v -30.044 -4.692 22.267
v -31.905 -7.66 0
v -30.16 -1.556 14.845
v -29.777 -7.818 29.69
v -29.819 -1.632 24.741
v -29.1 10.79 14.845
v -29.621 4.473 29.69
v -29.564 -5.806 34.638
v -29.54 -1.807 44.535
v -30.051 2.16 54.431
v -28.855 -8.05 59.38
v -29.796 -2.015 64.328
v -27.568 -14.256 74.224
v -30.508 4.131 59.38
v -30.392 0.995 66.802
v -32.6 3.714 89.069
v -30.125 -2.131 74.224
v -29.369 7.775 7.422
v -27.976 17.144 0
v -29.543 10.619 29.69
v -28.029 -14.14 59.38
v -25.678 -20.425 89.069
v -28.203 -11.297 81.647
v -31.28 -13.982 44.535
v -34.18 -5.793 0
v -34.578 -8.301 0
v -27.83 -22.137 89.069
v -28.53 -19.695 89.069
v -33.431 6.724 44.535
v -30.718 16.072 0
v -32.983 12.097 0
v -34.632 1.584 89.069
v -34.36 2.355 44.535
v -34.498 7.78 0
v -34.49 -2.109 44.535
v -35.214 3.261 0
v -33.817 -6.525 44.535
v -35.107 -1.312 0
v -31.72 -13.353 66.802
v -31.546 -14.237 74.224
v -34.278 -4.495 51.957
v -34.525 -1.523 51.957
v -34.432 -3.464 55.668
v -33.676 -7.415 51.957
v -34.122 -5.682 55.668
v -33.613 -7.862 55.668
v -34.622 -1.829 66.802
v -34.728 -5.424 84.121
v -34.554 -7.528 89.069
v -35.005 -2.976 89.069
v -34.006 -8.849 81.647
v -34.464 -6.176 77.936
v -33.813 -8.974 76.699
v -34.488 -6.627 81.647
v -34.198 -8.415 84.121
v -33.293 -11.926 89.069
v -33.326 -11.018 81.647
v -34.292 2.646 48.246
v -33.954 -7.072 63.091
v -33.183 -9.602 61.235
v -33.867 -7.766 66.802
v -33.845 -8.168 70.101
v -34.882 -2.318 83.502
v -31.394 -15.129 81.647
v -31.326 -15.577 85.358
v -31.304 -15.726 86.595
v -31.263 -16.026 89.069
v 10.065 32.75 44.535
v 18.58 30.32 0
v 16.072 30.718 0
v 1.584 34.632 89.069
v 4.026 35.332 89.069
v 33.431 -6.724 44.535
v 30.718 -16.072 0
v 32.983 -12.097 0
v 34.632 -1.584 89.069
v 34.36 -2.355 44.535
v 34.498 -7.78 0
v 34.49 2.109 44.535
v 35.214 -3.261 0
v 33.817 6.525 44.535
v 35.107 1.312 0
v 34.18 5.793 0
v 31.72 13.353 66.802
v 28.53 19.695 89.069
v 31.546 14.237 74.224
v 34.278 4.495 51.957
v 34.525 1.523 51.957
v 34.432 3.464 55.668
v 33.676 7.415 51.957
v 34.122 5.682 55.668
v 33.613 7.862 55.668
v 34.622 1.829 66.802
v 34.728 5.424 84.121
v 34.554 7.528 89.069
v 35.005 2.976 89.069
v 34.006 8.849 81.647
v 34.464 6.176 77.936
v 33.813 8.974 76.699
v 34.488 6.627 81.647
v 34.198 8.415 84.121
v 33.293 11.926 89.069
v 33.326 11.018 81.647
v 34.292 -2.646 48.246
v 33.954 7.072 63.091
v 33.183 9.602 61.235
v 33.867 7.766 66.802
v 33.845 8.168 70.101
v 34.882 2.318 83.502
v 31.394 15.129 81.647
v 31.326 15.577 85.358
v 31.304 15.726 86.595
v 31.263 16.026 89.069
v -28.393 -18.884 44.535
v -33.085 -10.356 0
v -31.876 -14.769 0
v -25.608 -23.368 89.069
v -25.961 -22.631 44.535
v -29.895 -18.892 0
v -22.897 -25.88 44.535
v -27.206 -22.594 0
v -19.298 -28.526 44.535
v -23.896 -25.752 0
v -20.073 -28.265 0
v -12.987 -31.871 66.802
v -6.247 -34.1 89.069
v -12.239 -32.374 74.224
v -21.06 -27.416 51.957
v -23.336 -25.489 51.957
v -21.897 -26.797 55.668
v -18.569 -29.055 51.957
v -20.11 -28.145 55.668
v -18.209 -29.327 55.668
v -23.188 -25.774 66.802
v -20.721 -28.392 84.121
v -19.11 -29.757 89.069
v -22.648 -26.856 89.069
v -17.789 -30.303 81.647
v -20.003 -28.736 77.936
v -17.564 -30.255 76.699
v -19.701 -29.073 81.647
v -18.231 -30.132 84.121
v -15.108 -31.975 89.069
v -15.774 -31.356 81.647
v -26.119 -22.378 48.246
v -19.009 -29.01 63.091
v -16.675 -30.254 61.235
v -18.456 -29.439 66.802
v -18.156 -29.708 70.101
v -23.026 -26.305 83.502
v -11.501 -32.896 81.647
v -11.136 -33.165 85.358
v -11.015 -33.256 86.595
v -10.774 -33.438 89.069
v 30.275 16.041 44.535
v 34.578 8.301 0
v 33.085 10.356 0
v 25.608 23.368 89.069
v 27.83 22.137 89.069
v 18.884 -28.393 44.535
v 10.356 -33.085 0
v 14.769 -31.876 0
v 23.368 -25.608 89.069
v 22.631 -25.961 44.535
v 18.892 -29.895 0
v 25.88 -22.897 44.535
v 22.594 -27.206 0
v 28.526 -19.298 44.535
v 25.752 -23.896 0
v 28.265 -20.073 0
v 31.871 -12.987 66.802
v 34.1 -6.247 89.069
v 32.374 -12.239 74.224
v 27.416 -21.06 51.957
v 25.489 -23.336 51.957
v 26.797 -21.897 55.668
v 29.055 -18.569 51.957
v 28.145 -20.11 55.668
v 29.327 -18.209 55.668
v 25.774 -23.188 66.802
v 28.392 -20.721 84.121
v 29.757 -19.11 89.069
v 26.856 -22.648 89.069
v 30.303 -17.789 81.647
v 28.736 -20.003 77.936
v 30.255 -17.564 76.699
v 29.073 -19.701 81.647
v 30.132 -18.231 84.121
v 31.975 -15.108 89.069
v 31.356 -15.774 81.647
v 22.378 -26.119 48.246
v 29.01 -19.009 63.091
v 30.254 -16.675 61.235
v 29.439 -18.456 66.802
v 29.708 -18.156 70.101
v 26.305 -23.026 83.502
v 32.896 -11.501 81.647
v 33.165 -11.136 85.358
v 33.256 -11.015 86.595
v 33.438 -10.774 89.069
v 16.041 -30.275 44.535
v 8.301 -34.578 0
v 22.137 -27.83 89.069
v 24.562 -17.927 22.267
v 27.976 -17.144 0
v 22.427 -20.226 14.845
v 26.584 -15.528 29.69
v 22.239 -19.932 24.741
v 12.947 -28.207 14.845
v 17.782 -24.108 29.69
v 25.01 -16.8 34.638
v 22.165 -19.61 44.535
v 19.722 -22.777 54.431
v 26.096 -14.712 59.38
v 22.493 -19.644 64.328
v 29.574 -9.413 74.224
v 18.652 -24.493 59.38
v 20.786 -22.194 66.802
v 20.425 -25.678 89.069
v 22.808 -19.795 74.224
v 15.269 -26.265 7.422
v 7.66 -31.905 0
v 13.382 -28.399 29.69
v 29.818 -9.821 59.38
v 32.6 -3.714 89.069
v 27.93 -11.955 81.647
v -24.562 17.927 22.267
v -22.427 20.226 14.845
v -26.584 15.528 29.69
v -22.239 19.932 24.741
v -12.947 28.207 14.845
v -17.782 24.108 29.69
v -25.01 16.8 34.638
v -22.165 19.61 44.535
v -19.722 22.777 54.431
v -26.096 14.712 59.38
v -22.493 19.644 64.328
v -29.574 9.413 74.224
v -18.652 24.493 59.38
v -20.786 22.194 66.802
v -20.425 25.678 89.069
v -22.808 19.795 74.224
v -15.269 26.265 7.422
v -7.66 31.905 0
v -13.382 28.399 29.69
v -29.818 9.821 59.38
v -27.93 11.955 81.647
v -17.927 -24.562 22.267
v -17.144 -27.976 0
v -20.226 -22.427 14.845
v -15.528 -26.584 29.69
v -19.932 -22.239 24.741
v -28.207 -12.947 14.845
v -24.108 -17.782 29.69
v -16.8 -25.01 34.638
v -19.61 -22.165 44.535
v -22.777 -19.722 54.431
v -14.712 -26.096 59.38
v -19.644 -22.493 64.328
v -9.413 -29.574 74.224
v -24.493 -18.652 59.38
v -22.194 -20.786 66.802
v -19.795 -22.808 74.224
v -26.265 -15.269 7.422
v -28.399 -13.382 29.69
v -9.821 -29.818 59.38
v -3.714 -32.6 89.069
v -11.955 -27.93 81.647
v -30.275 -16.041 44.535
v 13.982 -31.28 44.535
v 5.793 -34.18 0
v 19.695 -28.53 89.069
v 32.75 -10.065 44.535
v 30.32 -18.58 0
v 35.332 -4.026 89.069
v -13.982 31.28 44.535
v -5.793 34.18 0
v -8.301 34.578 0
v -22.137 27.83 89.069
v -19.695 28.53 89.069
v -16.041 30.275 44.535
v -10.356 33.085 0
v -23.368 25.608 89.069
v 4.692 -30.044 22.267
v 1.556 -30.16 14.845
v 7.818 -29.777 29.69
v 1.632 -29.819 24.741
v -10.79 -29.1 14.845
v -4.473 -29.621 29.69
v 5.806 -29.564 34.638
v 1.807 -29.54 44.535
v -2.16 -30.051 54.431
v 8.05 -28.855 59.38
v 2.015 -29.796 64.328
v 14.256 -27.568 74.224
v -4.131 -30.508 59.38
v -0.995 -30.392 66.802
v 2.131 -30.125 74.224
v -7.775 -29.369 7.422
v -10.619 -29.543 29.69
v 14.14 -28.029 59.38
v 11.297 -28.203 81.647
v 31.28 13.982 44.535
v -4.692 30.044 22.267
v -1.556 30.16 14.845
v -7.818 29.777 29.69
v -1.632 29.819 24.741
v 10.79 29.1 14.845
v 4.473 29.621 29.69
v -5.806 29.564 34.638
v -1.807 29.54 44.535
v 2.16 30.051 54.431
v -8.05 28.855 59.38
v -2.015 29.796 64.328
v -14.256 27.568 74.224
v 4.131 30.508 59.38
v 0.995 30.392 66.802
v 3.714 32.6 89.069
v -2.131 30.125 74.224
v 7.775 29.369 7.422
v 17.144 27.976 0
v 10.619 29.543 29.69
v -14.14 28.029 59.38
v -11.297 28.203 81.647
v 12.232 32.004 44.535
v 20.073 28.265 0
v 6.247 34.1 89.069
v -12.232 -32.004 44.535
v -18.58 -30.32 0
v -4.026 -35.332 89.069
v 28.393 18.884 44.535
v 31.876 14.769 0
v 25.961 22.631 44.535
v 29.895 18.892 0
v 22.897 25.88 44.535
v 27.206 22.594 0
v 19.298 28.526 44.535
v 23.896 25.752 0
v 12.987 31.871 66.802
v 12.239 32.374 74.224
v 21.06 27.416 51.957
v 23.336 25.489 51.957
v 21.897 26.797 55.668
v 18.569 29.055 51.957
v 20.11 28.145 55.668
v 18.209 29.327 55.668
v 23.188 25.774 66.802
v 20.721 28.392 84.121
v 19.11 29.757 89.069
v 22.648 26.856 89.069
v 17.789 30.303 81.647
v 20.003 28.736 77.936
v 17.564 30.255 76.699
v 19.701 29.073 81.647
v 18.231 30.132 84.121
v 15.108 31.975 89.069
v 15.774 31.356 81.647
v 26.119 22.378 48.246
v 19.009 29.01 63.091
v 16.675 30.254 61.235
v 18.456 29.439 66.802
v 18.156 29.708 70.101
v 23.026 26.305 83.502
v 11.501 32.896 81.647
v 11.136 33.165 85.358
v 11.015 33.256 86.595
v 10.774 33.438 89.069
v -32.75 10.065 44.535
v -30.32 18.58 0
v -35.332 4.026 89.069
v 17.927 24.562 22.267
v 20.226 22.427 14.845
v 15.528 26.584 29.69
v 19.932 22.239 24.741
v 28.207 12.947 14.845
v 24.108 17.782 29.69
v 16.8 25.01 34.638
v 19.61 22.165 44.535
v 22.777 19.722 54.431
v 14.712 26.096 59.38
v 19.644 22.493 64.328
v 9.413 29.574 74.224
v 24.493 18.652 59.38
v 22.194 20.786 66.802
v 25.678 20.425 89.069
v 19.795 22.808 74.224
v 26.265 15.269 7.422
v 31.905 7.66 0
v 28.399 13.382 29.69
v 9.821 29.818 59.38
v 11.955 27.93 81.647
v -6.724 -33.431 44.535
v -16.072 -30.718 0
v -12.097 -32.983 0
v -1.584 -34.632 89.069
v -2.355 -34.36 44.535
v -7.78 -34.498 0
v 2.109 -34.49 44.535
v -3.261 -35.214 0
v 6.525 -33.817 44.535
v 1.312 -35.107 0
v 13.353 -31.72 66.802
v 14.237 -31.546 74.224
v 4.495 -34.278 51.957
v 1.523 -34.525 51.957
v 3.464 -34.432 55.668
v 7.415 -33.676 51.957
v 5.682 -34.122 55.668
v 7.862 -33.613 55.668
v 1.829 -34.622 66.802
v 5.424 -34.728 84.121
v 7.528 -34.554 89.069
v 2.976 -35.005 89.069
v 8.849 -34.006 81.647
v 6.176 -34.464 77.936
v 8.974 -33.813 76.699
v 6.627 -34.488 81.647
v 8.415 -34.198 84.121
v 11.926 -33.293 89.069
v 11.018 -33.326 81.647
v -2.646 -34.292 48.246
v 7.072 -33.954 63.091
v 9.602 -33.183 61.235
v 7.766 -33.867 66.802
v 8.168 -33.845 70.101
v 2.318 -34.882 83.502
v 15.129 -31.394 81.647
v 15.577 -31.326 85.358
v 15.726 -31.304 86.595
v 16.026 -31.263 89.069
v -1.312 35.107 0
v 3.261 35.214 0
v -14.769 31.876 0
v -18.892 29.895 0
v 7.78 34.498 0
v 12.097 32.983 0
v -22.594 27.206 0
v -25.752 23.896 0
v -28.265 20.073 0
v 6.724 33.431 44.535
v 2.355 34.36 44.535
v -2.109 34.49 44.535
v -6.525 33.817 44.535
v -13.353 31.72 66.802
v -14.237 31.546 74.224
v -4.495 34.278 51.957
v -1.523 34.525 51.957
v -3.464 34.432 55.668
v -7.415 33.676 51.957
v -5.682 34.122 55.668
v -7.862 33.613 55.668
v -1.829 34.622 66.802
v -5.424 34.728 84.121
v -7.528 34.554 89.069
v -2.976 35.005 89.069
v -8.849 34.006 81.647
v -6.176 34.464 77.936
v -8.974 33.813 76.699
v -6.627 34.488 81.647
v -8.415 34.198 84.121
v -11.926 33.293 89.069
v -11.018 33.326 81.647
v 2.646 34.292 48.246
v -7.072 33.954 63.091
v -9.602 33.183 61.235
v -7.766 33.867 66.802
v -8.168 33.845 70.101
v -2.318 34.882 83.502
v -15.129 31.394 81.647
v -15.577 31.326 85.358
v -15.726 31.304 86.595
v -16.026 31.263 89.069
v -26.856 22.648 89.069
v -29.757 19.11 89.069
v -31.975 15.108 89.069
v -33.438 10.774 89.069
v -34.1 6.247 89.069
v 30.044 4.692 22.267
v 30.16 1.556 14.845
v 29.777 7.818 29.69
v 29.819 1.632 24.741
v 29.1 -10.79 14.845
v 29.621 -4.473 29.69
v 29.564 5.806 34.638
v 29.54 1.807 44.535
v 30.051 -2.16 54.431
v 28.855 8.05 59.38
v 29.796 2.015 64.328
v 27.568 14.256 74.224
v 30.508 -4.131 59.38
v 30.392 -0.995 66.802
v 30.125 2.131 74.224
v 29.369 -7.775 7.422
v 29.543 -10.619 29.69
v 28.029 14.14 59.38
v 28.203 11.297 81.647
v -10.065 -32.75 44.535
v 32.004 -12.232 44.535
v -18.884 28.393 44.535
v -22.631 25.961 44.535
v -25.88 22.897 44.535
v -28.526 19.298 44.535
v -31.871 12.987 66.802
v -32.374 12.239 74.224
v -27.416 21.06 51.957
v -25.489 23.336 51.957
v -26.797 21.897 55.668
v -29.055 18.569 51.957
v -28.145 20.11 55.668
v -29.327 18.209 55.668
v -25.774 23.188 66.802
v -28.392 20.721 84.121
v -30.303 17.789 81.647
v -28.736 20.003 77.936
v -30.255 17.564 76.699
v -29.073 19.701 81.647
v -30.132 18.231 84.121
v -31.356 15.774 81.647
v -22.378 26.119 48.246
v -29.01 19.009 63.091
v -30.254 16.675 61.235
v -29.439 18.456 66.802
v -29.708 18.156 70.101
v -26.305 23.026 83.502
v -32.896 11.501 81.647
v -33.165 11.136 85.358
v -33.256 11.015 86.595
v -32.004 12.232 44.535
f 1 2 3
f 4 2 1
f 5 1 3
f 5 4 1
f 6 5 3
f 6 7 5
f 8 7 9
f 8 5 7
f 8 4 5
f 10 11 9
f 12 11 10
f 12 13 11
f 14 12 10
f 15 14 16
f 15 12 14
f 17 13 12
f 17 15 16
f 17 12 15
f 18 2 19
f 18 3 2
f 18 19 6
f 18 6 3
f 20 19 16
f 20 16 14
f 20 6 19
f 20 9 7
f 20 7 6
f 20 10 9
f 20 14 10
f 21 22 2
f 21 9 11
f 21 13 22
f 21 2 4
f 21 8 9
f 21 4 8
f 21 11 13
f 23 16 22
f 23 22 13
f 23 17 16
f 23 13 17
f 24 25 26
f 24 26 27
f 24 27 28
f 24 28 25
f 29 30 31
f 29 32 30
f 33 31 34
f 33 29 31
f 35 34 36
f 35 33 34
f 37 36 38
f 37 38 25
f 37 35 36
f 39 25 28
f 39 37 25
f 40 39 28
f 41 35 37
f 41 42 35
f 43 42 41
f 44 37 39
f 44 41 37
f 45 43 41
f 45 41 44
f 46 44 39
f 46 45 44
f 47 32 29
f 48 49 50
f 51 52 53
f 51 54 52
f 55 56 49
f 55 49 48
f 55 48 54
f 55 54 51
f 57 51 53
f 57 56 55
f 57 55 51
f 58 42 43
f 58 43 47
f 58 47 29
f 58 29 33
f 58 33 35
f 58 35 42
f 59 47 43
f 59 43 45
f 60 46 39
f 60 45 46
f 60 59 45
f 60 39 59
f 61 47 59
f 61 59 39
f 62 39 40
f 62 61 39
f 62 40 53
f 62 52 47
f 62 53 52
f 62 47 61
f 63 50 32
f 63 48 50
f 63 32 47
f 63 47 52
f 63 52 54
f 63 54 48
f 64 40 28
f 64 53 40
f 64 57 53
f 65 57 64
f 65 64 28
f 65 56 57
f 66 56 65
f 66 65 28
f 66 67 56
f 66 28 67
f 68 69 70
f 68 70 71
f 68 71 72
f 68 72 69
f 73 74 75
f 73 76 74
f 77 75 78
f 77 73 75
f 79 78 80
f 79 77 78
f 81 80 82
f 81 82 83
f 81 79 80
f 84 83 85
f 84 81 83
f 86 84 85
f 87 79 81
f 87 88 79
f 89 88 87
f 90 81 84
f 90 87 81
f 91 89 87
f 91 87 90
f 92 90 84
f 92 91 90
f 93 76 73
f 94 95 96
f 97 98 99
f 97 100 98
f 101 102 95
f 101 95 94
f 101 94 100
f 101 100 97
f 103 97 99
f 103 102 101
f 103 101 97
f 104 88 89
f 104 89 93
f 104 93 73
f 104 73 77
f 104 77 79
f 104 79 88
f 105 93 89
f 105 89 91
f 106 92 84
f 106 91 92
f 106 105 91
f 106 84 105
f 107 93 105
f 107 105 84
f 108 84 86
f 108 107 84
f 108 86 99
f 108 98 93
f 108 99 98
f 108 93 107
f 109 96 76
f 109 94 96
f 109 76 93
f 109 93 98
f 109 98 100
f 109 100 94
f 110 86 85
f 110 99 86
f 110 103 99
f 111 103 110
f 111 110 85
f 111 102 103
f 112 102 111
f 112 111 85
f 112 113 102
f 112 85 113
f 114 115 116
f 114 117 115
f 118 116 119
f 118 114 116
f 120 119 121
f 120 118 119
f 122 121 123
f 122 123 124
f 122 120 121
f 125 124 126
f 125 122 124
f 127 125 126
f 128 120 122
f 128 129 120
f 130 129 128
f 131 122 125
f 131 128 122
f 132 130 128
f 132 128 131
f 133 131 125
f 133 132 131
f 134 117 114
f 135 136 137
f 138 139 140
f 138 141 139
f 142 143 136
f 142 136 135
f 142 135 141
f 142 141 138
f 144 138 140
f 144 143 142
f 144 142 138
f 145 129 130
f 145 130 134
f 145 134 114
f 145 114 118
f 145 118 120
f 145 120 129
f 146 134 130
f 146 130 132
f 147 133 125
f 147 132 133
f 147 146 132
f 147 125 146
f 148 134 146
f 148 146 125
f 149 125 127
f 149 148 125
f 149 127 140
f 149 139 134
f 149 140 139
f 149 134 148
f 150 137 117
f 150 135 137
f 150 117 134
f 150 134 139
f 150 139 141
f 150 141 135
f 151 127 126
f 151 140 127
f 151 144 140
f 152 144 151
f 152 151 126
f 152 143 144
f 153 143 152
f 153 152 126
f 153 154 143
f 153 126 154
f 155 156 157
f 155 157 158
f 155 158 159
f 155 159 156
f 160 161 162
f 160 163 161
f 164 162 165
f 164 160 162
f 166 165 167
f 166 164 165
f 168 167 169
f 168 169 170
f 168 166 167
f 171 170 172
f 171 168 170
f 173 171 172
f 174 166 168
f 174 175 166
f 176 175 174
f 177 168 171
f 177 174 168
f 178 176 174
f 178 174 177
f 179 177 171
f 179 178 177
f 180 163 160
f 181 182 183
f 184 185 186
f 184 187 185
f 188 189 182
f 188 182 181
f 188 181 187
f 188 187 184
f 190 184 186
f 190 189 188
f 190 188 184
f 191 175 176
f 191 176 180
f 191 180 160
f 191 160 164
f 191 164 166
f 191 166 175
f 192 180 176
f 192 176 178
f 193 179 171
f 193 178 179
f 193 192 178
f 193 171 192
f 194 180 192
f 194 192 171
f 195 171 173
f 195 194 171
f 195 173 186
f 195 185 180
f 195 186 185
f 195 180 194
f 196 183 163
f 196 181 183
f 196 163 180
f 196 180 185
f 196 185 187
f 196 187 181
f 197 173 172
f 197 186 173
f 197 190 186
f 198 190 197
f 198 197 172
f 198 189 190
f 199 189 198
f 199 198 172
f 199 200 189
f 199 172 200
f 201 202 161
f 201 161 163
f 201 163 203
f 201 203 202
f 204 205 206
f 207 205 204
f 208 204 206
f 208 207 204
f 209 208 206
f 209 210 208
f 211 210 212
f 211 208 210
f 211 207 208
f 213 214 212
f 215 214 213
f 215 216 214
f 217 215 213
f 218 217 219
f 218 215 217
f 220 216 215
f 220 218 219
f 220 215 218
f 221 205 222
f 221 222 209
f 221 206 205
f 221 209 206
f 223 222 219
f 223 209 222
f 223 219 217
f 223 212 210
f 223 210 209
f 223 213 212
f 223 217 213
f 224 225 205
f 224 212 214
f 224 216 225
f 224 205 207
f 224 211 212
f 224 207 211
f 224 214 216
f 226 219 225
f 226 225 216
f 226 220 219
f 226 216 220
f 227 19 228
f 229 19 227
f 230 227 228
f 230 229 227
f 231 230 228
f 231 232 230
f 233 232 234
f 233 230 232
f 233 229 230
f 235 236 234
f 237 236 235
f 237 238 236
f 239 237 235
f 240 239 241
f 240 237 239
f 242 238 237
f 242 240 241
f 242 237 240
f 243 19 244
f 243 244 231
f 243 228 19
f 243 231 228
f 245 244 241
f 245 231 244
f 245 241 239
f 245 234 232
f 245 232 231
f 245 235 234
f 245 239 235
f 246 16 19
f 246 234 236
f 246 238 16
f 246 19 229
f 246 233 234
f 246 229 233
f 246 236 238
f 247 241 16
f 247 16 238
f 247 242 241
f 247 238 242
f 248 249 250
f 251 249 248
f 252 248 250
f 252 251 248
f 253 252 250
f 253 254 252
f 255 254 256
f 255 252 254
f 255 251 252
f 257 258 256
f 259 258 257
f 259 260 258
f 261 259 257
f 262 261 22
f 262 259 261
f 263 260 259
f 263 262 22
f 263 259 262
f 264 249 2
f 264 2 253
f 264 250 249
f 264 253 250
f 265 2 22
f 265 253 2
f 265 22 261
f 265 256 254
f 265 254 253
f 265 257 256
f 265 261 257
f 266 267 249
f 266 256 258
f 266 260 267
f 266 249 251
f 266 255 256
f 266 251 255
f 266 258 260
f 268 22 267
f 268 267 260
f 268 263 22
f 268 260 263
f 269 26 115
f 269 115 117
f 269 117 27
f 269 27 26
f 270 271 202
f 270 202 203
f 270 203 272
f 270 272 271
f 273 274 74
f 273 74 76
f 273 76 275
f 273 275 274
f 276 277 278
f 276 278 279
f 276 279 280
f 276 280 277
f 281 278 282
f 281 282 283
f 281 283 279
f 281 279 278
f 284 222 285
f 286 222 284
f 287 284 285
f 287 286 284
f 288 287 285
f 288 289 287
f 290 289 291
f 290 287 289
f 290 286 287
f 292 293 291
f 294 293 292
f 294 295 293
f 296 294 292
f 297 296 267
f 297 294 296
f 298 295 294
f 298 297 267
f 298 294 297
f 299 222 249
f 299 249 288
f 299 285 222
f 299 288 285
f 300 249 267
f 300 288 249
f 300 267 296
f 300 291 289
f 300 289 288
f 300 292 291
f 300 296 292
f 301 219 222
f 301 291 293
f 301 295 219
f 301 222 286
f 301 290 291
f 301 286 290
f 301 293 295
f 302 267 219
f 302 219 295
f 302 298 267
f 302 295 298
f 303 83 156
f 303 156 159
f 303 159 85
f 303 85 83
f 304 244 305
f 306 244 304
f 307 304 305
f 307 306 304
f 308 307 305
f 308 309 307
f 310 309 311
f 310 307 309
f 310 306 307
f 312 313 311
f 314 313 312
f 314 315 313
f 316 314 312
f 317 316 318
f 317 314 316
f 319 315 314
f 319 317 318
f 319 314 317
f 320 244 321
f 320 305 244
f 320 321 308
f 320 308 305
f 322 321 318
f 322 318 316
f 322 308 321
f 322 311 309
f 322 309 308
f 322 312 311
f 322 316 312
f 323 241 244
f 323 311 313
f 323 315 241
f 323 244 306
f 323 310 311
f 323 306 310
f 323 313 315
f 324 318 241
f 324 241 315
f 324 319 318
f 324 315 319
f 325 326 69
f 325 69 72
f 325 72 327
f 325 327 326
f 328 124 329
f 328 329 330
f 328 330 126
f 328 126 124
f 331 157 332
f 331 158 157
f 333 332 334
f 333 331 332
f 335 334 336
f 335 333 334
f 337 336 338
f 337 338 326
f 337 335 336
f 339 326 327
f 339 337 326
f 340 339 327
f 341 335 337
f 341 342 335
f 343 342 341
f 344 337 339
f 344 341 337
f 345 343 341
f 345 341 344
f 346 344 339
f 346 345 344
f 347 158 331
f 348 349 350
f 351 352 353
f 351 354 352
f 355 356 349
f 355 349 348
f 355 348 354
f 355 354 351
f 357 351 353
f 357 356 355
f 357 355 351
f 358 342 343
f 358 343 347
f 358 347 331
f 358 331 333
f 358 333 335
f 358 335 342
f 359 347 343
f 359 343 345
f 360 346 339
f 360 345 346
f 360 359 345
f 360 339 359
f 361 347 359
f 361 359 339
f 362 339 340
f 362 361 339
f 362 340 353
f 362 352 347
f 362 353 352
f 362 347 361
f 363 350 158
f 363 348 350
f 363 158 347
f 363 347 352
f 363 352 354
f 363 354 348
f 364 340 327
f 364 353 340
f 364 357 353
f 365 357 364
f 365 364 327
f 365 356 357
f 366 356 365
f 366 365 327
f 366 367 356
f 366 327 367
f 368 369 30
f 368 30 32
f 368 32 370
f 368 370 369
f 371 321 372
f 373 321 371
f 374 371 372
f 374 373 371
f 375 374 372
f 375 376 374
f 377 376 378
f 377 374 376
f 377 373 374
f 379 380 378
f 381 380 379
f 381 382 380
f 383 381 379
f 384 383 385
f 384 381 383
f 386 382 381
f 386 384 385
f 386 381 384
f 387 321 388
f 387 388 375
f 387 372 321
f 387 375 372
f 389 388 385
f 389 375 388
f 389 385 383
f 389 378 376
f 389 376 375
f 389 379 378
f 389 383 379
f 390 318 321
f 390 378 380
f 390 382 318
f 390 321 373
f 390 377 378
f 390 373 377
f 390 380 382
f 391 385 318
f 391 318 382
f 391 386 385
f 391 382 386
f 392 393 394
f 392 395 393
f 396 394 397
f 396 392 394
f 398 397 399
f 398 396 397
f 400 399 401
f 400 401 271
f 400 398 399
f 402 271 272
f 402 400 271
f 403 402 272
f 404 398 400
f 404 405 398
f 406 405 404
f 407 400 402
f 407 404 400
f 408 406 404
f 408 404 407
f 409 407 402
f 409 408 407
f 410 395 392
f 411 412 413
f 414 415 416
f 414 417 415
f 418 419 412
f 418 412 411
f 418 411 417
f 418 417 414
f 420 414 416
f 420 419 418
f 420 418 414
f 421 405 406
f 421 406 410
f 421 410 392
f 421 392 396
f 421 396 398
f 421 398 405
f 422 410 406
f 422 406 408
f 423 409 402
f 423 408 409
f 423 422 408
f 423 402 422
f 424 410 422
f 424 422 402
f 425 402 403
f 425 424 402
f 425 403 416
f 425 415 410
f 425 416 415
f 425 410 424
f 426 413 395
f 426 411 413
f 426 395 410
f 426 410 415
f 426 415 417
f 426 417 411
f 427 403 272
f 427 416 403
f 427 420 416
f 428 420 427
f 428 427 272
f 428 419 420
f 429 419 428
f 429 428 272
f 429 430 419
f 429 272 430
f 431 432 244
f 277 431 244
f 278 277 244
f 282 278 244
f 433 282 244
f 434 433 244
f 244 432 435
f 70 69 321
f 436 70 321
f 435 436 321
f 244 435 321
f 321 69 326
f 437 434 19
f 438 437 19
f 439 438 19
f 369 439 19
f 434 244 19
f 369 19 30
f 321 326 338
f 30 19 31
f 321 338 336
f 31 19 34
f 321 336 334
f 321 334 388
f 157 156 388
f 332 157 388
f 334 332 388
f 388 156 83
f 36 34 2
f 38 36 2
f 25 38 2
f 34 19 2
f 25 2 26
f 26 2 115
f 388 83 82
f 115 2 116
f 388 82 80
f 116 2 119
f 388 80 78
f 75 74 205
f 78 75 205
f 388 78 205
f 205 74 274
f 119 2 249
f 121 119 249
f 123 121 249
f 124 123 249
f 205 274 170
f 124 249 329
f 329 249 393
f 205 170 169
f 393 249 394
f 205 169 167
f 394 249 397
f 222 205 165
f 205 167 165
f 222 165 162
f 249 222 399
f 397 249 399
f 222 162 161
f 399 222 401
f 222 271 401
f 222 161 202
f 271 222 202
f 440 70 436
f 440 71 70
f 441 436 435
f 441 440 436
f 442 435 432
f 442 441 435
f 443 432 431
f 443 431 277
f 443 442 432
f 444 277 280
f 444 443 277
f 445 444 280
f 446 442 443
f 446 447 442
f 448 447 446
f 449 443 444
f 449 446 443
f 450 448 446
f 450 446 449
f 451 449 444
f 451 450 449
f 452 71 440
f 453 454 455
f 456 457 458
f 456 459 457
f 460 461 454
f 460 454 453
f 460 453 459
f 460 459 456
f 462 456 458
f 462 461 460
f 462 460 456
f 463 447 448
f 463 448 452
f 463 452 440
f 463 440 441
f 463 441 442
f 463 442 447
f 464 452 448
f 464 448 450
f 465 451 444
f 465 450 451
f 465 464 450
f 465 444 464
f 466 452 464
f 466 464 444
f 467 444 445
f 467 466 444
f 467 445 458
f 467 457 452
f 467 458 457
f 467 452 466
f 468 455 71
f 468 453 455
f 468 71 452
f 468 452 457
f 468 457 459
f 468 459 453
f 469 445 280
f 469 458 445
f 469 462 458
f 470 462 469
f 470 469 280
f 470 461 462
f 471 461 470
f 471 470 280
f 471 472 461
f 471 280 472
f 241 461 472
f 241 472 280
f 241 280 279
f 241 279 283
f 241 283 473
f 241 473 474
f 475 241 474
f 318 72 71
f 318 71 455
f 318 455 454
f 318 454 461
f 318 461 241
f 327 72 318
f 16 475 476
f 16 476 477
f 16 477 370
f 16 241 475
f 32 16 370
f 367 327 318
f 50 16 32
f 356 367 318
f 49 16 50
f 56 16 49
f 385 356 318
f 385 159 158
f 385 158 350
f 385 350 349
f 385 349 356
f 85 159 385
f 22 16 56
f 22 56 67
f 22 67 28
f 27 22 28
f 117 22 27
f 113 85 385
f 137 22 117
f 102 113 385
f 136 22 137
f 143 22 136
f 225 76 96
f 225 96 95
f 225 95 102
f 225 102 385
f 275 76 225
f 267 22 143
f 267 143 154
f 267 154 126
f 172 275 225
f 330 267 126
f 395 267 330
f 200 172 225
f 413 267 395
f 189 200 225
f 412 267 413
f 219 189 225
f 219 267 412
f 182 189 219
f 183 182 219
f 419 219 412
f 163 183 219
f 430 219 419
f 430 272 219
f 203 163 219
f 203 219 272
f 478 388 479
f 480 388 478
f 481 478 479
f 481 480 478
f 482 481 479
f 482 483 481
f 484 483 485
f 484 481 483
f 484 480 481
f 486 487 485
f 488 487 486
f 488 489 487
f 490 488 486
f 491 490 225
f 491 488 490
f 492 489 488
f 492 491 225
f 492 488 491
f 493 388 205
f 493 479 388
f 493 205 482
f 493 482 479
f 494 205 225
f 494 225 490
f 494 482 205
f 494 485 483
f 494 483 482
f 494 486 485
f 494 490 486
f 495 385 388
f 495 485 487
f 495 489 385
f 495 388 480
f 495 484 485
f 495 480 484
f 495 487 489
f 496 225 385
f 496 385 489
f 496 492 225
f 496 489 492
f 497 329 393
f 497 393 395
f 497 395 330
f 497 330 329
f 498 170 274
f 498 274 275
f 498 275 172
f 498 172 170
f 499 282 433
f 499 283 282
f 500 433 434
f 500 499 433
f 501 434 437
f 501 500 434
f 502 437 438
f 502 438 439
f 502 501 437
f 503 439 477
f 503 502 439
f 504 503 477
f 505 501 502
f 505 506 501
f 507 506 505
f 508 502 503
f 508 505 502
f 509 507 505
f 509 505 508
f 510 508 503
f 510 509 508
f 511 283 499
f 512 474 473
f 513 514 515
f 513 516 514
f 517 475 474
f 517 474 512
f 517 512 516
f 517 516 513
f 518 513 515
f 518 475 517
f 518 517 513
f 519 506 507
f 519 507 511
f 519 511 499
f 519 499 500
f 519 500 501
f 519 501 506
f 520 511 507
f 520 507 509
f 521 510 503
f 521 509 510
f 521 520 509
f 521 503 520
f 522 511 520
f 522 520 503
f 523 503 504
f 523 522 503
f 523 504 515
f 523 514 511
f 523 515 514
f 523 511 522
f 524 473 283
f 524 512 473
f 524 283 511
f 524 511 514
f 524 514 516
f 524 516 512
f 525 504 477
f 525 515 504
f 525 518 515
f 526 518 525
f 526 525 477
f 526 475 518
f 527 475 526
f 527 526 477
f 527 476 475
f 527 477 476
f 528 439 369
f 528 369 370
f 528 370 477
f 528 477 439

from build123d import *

# Parameters (mm, degrees)
F5_COUNT = 8
F5_ANGLE = 315


with BuildPart() as f4:
    # F0 (on Top) → F4 section 0
    with BuildSketch(Plane.XY):
        with BuildLine():
            Line((7.6595910871, -31.9045038767), (8.3013966604, -34.5778173951))
            Line((8.3013966604, -34.5778173951), (10.3562999417, -33.0848430134))
            ThreePointArc((10.3562999417, -33.0848430134), (20.8037642272, -28.6339296223), (28.2652797493, -20.0732096686))
            Line((28.2652797493, -20.0732096686), (30.3201830306, -18.5802352869))
            Line((30.3201830306, -18.5802352869), (27.9760398404, -17.1437422427))
            Line((27.9760398404, -17.1437422427), (7.6595910871, -31.9045038767))
        make_face()
    # F3 (on plane+point) → F4 section 1
    with BuildSketch(Plane.XY.offset(89.0693292022)):
        with BuildLine():
            Line((35.3317647247, -4.0255488774), (32.6001613042, -3.7143217658))
            Line((32.6001613042, -3.7143217658), (20.4253730178, -25.6782172341))
            Line((20.4253730178, -25.6782172341), (22.1368375189, -27.8298233373))
            Line((22.1368375189, -27.8298233373), (23.3682541263, -25.6082893765))
            ThreePointArc((23.3682541263, -25.6082893765), (30.9558350826, -17.1591027148), (34.1003481172, -6.2470828382))
            Line((34.1003481172, -6.2470828382), (35.3317647247, -4.0255488774))
        make_face()
    loft()

    # F5: F4 ×8 about axis
    f5_axis = Axis((0, 0, 44.5346646011), (0, 0, 1))


with BuildPart() as f4_1:
    add(f4.part)
    for i in range(1, F5_COUNT):
        add(f4.part.rotate(f5_axis, i * F5_ANGLE / (F5_COUNT - 1)))


solid = f4_1.part
